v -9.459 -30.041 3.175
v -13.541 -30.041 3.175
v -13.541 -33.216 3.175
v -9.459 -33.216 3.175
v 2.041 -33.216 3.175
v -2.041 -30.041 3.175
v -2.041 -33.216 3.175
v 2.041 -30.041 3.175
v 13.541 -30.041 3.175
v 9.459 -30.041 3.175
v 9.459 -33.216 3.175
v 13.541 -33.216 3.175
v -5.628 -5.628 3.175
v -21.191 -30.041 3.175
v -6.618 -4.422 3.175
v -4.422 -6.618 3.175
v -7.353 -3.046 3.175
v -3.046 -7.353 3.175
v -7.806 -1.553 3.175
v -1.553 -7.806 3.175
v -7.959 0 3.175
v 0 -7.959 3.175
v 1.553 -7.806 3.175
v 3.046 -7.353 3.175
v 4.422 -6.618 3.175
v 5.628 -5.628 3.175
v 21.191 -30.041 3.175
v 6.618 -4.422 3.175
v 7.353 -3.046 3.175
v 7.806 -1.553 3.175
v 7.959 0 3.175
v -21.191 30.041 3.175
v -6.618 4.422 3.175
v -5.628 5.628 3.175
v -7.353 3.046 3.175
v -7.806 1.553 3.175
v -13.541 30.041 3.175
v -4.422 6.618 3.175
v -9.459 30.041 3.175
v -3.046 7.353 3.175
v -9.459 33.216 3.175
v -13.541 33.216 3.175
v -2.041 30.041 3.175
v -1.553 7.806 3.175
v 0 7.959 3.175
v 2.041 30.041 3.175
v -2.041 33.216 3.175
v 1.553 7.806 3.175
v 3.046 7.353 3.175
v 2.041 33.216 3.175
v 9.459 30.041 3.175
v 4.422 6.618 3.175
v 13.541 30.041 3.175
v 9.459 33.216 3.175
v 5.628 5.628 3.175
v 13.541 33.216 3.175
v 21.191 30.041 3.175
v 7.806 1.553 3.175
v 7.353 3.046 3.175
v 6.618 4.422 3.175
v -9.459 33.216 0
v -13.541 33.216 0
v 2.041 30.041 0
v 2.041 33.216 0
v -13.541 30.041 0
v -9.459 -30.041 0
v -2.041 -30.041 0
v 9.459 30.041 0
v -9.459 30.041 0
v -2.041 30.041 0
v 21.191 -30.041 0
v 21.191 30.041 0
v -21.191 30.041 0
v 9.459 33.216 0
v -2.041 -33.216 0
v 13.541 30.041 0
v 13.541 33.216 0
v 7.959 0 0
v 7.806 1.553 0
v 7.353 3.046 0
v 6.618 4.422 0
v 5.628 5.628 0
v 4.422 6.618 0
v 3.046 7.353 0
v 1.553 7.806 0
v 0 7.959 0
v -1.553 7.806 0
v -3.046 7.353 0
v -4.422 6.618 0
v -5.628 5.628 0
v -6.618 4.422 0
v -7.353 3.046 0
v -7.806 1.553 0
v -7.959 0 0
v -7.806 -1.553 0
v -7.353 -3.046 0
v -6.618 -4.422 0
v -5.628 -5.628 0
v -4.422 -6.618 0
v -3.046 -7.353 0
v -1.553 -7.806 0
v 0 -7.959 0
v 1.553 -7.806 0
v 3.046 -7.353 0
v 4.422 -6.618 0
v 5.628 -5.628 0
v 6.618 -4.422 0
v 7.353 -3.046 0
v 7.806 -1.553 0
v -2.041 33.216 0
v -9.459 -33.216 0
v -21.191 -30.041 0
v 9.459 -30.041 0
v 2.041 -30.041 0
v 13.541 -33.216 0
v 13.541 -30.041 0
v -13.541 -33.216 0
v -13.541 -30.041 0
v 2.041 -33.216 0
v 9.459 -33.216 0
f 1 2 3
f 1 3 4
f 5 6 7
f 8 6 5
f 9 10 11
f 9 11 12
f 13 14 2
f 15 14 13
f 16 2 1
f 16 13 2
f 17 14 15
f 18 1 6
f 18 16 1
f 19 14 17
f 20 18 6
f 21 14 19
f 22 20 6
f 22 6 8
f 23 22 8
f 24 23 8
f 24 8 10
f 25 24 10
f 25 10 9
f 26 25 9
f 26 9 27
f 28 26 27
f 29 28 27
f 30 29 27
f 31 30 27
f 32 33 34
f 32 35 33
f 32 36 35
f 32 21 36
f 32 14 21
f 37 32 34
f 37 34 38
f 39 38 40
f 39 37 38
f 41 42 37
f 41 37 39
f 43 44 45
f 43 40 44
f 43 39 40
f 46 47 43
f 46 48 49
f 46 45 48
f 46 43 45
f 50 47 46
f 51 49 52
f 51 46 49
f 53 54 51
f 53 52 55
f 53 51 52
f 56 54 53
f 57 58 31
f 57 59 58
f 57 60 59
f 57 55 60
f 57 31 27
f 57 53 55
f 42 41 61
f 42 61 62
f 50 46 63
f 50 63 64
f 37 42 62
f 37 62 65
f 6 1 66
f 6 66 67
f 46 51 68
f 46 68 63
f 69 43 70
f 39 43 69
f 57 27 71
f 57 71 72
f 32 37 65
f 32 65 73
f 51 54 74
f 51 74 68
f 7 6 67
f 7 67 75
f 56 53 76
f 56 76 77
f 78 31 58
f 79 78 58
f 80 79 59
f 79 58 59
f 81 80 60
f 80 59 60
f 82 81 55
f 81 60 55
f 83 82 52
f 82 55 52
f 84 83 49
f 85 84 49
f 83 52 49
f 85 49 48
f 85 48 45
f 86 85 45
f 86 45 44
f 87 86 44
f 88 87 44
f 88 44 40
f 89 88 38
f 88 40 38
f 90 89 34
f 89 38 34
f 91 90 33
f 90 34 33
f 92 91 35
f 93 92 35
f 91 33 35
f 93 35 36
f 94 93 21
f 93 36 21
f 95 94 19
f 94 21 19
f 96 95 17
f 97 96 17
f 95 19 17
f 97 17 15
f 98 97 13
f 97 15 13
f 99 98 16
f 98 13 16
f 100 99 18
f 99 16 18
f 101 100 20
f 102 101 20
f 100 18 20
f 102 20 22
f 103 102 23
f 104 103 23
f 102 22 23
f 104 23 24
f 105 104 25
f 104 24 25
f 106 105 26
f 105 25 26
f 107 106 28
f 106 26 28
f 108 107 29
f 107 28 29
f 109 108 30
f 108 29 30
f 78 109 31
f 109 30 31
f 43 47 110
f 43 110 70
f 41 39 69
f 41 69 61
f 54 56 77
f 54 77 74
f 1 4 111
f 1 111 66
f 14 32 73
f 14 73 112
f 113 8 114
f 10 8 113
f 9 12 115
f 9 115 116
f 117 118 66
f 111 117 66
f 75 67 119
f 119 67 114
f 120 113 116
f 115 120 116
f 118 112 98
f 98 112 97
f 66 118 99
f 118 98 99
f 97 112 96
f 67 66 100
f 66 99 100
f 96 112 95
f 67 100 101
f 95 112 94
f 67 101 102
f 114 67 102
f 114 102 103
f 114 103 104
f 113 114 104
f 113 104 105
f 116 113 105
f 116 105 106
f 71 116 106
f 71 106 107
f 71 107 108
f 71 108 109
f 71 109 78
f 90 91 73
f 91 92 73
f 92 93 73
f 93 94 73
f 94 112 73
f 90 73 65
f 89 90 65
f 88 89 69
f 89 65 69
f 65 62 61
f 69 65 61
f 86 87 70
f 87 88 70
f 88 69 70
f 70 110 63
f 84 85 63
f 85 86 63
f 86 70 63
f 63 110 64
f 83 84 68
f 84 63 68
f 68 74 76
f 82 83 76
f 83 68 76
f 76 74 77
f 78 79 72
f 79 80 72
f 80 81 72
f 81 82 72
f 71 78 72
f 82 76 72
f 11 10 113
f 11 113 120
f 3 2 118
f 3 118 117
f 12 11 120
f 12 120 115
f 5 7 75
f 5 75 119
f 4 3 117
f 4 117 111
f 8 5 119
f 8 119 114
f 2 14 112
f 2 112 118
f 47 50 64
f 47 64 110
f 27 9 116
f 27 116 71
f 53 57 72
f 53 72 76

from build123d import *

# Parameters (mm, degrees)
SKETCH1_R           = 8
BOSS_EXTRUDE1_DEPTH = 3.175
SKETCH2_R           = 7.95936
BOSS_EXTRUDE3_DEPTH = 3.175


with BuildPart() as part:
    # Sketch1 → Boss-Extrude1 (new body)
    with BuildSketch(Plane.XY):
        Polygon((-13.5, 30), (-21.15, 30), (-21.15, -30), (-13.5, -30), (-13.5, -33.175), (-9.5, -33.175), (-9.5, -30), (-2, -30), (-2, -33.175), (2, -33.175), (2, -30), (9.5, -30), (9.5, -33.175), (13.5, -33.175), (13.5, -30), (21.15, -30), (21.15, 30), (13.5, 30), (13.5, 33.175), (9.5, 33.175), (9.5, 30), (2, 30), (2, 33.175), (-2, 33.175), (-2, 30), (-9.5, 30), (-9.5, 33.175), (-13.5, 33.175), align=None)
        Circle(SKETCH1_R, mode=Mode.SUBTRACT)
    extrude(amount=BOSS_EXTRUDE1_DEPTH)

    # Sketch2 → Boss-Extrude3 (add)
    with BuildSketch(Plane.XY.offset(3.175)):
        Polygon((21.19064, -30.04064), (21.19064, 30.04064), (13.54064, 30.04064), (13.54064, 33.21564), (9.45936, 33.21564), (9.45936, 30.04064), (2.04064, 30.04064), (2.04064, 33.21564), (-2.04064, 33.21564), (-2.04064, 30.04064), (-9.45936, 30.04064), (-9.45936, 33.21564), (-13.54064, 33.21564), (-13.54064, 30.04064), (-21.19064, 30.04064), (-21.19064, -30.04064), (-13.54064, -30.04064), (-13.54064, -33.21564), (-9.45936, -33.21564), (-9.45936, -30.04064), (-2.04064, -30.04064), (-2.04064, -33.21564), (2.04064, -33.21564), (2.04064, -30.04064), (9.45936, -30.04064), (9.45936, -33.21564), (13.54064, -33.21564), (13.54064, -30.04064), align=None)
        Circle(SKETCH2_R, mode=Mode.SUBTRACT)
    extrude(amount=-BOSS_EXTRUDE3_DEPTH)


solid = part.part
